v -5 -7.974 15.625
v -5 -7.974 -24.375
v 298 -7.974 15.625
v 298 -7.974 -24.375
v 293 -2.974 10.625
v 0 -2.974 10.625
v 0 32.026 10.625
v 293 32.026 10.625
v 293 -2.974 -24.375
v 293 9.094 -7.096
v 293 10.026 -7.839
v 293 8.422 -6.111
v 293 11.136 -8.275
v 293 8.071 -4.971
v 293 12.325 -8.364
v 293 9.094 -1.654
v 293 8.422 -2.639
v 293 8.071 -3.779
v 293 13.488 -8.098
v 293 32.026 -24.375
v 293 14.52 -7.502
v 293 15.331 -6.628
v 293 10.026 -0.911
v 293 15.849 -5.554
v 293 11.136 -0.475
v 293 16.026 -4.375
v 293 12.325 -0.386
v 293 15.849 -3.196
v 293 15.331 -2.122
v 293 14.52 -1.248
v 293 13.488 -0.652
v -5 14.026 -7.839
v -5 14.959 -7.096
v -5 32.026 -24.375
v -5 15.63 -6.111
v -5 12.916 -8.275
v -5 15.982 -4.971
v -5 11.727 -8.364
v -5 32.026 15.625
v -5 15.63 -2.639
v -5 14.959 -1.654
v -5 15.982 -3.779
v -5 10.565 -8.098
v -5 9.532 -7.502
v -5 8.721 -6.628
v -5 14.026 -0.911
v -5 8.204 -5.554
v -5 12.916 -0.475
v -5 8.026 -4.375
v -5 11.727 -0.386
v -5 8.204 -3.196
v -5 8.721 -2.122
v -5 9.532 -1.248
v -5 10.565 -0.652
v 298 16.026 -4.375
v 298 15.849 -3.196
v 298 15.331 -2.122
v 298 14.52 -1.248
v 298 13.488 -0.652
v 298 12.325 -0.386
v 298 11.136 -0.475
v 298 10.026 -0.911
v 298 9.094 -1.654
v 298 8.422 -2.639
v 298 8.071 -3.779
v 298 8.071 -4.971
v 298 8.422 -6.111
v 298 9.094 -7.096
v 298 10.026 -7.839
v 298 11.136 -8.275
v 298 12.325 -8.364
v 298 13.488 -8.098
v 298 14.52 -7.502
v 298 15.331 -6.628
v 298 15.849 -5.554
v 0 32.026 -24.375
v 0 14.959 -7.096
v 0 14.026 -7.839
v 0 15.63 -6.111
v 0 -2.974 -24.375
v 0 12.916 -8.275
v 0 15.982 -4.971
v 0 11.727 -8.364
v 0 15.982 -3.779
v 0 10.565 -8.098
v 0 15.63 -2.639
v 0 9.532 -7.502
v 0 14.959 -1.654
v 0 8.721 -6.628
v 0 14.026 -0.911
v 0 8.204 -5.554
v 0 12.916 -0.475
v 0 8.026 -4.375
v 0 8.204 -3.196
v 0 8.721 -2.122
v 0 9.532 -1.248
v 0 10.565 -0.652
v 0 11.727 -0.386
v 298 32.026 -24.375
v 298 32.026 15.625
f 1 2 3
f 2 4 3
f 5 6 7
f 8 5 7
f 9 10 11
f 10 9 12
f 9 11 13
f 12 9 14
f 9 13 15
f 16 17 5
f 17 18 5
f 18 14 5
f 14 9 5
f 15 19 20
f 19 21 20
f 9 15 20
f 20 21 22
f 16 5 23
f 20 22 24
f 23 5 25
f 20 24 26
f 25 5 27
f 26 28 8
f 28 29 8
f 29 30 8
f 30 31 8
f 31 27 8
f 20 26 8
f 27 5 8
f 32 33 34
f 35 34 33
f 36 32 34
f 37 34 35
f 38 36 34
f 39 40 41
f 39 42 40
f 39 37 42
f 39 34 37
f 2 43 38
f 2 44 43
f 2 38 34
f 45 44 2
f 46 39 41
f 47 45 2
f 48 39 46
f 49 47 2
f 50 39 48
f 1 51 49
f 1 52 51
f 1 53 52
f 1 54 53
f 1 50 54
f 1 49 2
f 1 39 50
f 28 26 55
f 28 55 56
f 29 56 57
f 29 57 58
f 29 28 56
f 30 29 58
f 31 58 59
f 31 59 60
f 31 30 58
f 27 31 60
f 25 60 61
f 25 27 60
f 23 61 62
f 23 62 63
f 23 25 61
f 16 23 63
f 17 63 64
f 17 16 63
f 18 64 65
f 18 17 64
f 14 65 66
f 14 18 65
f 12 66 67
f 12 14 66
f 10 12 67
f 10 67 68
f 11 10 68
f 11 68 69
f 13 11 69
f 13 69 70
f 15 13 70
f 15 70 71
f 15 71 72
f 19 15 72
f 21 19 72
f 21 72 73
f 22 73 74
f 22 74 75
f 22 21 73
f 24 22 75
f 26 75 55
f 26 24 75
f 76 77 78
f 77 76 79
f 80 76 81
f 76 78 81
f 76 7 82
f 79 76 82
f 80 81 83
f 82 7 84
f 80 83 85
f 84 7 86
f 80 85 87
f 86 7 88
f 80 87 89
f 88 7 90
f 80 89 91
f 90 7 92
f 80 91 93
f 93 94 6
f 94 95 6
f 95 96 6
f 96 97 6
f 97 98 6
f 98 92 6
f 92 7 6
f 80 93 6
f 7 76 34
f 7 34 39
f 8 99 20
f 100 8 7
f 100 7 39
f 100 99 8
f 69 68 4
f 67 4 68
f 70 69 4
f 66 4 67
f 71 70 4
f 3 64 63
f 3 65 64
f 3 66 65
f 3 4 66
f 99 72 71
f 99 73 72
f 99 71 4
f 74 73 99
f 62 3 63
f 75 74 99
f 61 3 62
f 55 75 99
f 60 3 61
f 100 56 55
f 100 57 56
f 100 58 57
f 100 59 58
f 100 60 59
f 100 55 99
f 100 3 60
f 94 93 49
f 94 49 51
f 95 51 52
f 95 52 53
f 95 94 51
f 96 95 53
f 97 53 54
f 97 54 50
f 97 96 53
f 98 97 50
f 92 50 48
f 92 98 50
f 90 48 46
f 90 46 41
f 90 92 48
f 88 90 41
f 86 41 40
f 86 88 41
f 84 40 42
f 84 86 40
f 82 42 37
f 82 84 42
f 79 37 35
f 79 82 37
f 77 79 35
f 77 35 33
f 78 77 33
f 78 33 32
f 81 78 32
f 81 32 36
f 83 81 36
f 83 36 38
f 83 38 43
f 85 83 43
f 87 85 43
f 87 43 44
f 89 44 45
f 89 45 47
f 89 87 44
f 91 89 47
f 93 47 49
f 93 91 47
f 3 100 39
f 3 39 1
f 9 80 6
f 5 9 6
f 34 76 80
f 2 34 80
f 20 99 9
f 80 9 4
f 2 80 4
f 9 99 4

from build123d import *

# Parameters (mm, degrees)
F1_DEPTH = 293
F2_W     = 35
F2_H     = 35
F2_R     = 4
F3_DEPTH = 5
F4_W     = 40
F4_H     = 40
F4_R     = 4
F5_DEPTH = 5


with BuildPart() as f1:
    # F0 (on Right) → F1 (new body)
    with BuildSketch(Plane.YZ):
        Polygon((-7.9736986477, 15.6249996814), (-7.9736986477, -24.3750003186), (-2.9736986477, -24.3750003186), (-2.9736986477, 10.6249996814), (32.0263013523, 10.6249996814), (32.0263013523, 15.6249996814), align=None)
    extrude(amount=F1_DEPTH)

    # F2 (on face) → F3 (join)
    with BuildSketch(Plane.YZ.offset(293)):
        Polygon((-7.9736986477, 15.6249996814), (-7.9736986477, -24.3750003186), (-2.9736986477, -24.3750003186), (-2.9736986477, 10.6249996814), (32.0263013523, 10.6249996814), (32.0263013523, 15.6249996814), align=None)
        with Locations((14.5263013523, -6.8750003186)):
            Rectangle(F2_W, F2_H)
        with Locations((12.0263013523, -4.3750003186)):
            Circle(F2_R, mode=Mode.SUBTRACT)
    extrude(amount=F3_DEPTH)

    # F4 (on face) → F5 (join)
    with BuildSketch(Plane(origin=(0, 0, 0), x_dir=(0, -1, 0), z_dir=(-1, 0, 0))):
        with Locations((-12.0263013523, -4.3750003186)):
            Rectangle(F4_W, F4_H)
        with Locations((-12.0263013523, -4.3750003186)):
            Circle(F4_R, mode=Mode.SUBTRACT)
    extrude(amount=F5_DEPTH)


solid = f1.part
